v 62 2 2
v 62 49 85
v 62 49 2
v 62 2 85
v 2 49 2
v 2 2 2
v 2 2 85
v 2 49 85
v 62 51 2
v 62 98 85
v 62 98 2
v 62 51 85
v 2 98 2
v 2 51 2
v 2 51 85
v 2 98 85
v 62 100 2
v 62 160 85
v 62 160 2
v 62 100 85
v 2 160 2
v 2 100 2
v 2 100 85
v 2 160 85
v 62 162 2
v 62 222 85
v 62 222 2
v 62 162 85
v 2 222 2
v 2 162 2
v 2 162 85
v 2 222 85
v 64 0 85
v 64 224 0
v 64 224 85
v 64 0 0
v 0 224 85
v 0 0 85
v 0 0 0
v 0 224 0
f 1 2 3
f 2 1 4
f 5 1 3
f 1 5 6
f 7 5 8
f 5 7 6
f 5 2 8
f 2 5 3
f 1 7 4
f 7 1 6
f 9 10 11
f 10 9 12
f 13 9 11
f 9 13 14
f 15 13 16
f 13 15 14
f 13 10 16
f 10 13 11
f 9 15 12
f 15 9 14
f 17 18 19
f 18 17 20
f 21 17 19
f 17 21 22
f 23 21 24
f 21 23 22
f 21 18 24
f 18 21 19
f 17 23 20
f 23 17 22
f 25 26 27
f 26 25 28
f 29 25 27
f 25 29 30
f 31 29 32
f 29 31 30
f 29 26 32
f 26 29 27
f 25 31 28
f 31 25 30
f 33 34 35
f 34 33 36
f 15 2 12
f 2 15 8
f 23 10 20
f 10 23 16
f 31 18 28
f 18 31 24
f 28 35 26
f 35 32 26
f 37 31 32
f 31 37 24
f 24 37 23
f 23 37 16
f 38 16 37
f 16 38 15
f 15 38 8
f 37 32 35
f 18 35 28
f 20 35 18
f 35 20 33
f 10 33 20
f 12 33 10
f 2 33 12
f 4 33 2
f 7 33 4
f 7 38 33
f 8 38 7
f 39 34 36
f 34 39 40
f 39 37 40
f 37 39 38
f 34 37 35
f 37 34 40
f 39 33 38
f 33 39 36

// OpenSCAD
l_20=55+5;
l_10=42+5;

l= max(l_20, l_10);

wall=2;
difference() {
	cube([l+wall*2,l_20*2+l_10*2+wall*5,85]);
	translate([wall,wall,wall]) {
		cube([l,l_10,90]);
		translate([0,l_10+wall,0])
			cube([l,l_10,90]);
		translate([0,l_10*2+wall*2,0])
			cube([l,l_20,90]);
		translate([0,l_10*2+l_20+wall*3,0])
			cube([l,l_20,90]);
	}
}
